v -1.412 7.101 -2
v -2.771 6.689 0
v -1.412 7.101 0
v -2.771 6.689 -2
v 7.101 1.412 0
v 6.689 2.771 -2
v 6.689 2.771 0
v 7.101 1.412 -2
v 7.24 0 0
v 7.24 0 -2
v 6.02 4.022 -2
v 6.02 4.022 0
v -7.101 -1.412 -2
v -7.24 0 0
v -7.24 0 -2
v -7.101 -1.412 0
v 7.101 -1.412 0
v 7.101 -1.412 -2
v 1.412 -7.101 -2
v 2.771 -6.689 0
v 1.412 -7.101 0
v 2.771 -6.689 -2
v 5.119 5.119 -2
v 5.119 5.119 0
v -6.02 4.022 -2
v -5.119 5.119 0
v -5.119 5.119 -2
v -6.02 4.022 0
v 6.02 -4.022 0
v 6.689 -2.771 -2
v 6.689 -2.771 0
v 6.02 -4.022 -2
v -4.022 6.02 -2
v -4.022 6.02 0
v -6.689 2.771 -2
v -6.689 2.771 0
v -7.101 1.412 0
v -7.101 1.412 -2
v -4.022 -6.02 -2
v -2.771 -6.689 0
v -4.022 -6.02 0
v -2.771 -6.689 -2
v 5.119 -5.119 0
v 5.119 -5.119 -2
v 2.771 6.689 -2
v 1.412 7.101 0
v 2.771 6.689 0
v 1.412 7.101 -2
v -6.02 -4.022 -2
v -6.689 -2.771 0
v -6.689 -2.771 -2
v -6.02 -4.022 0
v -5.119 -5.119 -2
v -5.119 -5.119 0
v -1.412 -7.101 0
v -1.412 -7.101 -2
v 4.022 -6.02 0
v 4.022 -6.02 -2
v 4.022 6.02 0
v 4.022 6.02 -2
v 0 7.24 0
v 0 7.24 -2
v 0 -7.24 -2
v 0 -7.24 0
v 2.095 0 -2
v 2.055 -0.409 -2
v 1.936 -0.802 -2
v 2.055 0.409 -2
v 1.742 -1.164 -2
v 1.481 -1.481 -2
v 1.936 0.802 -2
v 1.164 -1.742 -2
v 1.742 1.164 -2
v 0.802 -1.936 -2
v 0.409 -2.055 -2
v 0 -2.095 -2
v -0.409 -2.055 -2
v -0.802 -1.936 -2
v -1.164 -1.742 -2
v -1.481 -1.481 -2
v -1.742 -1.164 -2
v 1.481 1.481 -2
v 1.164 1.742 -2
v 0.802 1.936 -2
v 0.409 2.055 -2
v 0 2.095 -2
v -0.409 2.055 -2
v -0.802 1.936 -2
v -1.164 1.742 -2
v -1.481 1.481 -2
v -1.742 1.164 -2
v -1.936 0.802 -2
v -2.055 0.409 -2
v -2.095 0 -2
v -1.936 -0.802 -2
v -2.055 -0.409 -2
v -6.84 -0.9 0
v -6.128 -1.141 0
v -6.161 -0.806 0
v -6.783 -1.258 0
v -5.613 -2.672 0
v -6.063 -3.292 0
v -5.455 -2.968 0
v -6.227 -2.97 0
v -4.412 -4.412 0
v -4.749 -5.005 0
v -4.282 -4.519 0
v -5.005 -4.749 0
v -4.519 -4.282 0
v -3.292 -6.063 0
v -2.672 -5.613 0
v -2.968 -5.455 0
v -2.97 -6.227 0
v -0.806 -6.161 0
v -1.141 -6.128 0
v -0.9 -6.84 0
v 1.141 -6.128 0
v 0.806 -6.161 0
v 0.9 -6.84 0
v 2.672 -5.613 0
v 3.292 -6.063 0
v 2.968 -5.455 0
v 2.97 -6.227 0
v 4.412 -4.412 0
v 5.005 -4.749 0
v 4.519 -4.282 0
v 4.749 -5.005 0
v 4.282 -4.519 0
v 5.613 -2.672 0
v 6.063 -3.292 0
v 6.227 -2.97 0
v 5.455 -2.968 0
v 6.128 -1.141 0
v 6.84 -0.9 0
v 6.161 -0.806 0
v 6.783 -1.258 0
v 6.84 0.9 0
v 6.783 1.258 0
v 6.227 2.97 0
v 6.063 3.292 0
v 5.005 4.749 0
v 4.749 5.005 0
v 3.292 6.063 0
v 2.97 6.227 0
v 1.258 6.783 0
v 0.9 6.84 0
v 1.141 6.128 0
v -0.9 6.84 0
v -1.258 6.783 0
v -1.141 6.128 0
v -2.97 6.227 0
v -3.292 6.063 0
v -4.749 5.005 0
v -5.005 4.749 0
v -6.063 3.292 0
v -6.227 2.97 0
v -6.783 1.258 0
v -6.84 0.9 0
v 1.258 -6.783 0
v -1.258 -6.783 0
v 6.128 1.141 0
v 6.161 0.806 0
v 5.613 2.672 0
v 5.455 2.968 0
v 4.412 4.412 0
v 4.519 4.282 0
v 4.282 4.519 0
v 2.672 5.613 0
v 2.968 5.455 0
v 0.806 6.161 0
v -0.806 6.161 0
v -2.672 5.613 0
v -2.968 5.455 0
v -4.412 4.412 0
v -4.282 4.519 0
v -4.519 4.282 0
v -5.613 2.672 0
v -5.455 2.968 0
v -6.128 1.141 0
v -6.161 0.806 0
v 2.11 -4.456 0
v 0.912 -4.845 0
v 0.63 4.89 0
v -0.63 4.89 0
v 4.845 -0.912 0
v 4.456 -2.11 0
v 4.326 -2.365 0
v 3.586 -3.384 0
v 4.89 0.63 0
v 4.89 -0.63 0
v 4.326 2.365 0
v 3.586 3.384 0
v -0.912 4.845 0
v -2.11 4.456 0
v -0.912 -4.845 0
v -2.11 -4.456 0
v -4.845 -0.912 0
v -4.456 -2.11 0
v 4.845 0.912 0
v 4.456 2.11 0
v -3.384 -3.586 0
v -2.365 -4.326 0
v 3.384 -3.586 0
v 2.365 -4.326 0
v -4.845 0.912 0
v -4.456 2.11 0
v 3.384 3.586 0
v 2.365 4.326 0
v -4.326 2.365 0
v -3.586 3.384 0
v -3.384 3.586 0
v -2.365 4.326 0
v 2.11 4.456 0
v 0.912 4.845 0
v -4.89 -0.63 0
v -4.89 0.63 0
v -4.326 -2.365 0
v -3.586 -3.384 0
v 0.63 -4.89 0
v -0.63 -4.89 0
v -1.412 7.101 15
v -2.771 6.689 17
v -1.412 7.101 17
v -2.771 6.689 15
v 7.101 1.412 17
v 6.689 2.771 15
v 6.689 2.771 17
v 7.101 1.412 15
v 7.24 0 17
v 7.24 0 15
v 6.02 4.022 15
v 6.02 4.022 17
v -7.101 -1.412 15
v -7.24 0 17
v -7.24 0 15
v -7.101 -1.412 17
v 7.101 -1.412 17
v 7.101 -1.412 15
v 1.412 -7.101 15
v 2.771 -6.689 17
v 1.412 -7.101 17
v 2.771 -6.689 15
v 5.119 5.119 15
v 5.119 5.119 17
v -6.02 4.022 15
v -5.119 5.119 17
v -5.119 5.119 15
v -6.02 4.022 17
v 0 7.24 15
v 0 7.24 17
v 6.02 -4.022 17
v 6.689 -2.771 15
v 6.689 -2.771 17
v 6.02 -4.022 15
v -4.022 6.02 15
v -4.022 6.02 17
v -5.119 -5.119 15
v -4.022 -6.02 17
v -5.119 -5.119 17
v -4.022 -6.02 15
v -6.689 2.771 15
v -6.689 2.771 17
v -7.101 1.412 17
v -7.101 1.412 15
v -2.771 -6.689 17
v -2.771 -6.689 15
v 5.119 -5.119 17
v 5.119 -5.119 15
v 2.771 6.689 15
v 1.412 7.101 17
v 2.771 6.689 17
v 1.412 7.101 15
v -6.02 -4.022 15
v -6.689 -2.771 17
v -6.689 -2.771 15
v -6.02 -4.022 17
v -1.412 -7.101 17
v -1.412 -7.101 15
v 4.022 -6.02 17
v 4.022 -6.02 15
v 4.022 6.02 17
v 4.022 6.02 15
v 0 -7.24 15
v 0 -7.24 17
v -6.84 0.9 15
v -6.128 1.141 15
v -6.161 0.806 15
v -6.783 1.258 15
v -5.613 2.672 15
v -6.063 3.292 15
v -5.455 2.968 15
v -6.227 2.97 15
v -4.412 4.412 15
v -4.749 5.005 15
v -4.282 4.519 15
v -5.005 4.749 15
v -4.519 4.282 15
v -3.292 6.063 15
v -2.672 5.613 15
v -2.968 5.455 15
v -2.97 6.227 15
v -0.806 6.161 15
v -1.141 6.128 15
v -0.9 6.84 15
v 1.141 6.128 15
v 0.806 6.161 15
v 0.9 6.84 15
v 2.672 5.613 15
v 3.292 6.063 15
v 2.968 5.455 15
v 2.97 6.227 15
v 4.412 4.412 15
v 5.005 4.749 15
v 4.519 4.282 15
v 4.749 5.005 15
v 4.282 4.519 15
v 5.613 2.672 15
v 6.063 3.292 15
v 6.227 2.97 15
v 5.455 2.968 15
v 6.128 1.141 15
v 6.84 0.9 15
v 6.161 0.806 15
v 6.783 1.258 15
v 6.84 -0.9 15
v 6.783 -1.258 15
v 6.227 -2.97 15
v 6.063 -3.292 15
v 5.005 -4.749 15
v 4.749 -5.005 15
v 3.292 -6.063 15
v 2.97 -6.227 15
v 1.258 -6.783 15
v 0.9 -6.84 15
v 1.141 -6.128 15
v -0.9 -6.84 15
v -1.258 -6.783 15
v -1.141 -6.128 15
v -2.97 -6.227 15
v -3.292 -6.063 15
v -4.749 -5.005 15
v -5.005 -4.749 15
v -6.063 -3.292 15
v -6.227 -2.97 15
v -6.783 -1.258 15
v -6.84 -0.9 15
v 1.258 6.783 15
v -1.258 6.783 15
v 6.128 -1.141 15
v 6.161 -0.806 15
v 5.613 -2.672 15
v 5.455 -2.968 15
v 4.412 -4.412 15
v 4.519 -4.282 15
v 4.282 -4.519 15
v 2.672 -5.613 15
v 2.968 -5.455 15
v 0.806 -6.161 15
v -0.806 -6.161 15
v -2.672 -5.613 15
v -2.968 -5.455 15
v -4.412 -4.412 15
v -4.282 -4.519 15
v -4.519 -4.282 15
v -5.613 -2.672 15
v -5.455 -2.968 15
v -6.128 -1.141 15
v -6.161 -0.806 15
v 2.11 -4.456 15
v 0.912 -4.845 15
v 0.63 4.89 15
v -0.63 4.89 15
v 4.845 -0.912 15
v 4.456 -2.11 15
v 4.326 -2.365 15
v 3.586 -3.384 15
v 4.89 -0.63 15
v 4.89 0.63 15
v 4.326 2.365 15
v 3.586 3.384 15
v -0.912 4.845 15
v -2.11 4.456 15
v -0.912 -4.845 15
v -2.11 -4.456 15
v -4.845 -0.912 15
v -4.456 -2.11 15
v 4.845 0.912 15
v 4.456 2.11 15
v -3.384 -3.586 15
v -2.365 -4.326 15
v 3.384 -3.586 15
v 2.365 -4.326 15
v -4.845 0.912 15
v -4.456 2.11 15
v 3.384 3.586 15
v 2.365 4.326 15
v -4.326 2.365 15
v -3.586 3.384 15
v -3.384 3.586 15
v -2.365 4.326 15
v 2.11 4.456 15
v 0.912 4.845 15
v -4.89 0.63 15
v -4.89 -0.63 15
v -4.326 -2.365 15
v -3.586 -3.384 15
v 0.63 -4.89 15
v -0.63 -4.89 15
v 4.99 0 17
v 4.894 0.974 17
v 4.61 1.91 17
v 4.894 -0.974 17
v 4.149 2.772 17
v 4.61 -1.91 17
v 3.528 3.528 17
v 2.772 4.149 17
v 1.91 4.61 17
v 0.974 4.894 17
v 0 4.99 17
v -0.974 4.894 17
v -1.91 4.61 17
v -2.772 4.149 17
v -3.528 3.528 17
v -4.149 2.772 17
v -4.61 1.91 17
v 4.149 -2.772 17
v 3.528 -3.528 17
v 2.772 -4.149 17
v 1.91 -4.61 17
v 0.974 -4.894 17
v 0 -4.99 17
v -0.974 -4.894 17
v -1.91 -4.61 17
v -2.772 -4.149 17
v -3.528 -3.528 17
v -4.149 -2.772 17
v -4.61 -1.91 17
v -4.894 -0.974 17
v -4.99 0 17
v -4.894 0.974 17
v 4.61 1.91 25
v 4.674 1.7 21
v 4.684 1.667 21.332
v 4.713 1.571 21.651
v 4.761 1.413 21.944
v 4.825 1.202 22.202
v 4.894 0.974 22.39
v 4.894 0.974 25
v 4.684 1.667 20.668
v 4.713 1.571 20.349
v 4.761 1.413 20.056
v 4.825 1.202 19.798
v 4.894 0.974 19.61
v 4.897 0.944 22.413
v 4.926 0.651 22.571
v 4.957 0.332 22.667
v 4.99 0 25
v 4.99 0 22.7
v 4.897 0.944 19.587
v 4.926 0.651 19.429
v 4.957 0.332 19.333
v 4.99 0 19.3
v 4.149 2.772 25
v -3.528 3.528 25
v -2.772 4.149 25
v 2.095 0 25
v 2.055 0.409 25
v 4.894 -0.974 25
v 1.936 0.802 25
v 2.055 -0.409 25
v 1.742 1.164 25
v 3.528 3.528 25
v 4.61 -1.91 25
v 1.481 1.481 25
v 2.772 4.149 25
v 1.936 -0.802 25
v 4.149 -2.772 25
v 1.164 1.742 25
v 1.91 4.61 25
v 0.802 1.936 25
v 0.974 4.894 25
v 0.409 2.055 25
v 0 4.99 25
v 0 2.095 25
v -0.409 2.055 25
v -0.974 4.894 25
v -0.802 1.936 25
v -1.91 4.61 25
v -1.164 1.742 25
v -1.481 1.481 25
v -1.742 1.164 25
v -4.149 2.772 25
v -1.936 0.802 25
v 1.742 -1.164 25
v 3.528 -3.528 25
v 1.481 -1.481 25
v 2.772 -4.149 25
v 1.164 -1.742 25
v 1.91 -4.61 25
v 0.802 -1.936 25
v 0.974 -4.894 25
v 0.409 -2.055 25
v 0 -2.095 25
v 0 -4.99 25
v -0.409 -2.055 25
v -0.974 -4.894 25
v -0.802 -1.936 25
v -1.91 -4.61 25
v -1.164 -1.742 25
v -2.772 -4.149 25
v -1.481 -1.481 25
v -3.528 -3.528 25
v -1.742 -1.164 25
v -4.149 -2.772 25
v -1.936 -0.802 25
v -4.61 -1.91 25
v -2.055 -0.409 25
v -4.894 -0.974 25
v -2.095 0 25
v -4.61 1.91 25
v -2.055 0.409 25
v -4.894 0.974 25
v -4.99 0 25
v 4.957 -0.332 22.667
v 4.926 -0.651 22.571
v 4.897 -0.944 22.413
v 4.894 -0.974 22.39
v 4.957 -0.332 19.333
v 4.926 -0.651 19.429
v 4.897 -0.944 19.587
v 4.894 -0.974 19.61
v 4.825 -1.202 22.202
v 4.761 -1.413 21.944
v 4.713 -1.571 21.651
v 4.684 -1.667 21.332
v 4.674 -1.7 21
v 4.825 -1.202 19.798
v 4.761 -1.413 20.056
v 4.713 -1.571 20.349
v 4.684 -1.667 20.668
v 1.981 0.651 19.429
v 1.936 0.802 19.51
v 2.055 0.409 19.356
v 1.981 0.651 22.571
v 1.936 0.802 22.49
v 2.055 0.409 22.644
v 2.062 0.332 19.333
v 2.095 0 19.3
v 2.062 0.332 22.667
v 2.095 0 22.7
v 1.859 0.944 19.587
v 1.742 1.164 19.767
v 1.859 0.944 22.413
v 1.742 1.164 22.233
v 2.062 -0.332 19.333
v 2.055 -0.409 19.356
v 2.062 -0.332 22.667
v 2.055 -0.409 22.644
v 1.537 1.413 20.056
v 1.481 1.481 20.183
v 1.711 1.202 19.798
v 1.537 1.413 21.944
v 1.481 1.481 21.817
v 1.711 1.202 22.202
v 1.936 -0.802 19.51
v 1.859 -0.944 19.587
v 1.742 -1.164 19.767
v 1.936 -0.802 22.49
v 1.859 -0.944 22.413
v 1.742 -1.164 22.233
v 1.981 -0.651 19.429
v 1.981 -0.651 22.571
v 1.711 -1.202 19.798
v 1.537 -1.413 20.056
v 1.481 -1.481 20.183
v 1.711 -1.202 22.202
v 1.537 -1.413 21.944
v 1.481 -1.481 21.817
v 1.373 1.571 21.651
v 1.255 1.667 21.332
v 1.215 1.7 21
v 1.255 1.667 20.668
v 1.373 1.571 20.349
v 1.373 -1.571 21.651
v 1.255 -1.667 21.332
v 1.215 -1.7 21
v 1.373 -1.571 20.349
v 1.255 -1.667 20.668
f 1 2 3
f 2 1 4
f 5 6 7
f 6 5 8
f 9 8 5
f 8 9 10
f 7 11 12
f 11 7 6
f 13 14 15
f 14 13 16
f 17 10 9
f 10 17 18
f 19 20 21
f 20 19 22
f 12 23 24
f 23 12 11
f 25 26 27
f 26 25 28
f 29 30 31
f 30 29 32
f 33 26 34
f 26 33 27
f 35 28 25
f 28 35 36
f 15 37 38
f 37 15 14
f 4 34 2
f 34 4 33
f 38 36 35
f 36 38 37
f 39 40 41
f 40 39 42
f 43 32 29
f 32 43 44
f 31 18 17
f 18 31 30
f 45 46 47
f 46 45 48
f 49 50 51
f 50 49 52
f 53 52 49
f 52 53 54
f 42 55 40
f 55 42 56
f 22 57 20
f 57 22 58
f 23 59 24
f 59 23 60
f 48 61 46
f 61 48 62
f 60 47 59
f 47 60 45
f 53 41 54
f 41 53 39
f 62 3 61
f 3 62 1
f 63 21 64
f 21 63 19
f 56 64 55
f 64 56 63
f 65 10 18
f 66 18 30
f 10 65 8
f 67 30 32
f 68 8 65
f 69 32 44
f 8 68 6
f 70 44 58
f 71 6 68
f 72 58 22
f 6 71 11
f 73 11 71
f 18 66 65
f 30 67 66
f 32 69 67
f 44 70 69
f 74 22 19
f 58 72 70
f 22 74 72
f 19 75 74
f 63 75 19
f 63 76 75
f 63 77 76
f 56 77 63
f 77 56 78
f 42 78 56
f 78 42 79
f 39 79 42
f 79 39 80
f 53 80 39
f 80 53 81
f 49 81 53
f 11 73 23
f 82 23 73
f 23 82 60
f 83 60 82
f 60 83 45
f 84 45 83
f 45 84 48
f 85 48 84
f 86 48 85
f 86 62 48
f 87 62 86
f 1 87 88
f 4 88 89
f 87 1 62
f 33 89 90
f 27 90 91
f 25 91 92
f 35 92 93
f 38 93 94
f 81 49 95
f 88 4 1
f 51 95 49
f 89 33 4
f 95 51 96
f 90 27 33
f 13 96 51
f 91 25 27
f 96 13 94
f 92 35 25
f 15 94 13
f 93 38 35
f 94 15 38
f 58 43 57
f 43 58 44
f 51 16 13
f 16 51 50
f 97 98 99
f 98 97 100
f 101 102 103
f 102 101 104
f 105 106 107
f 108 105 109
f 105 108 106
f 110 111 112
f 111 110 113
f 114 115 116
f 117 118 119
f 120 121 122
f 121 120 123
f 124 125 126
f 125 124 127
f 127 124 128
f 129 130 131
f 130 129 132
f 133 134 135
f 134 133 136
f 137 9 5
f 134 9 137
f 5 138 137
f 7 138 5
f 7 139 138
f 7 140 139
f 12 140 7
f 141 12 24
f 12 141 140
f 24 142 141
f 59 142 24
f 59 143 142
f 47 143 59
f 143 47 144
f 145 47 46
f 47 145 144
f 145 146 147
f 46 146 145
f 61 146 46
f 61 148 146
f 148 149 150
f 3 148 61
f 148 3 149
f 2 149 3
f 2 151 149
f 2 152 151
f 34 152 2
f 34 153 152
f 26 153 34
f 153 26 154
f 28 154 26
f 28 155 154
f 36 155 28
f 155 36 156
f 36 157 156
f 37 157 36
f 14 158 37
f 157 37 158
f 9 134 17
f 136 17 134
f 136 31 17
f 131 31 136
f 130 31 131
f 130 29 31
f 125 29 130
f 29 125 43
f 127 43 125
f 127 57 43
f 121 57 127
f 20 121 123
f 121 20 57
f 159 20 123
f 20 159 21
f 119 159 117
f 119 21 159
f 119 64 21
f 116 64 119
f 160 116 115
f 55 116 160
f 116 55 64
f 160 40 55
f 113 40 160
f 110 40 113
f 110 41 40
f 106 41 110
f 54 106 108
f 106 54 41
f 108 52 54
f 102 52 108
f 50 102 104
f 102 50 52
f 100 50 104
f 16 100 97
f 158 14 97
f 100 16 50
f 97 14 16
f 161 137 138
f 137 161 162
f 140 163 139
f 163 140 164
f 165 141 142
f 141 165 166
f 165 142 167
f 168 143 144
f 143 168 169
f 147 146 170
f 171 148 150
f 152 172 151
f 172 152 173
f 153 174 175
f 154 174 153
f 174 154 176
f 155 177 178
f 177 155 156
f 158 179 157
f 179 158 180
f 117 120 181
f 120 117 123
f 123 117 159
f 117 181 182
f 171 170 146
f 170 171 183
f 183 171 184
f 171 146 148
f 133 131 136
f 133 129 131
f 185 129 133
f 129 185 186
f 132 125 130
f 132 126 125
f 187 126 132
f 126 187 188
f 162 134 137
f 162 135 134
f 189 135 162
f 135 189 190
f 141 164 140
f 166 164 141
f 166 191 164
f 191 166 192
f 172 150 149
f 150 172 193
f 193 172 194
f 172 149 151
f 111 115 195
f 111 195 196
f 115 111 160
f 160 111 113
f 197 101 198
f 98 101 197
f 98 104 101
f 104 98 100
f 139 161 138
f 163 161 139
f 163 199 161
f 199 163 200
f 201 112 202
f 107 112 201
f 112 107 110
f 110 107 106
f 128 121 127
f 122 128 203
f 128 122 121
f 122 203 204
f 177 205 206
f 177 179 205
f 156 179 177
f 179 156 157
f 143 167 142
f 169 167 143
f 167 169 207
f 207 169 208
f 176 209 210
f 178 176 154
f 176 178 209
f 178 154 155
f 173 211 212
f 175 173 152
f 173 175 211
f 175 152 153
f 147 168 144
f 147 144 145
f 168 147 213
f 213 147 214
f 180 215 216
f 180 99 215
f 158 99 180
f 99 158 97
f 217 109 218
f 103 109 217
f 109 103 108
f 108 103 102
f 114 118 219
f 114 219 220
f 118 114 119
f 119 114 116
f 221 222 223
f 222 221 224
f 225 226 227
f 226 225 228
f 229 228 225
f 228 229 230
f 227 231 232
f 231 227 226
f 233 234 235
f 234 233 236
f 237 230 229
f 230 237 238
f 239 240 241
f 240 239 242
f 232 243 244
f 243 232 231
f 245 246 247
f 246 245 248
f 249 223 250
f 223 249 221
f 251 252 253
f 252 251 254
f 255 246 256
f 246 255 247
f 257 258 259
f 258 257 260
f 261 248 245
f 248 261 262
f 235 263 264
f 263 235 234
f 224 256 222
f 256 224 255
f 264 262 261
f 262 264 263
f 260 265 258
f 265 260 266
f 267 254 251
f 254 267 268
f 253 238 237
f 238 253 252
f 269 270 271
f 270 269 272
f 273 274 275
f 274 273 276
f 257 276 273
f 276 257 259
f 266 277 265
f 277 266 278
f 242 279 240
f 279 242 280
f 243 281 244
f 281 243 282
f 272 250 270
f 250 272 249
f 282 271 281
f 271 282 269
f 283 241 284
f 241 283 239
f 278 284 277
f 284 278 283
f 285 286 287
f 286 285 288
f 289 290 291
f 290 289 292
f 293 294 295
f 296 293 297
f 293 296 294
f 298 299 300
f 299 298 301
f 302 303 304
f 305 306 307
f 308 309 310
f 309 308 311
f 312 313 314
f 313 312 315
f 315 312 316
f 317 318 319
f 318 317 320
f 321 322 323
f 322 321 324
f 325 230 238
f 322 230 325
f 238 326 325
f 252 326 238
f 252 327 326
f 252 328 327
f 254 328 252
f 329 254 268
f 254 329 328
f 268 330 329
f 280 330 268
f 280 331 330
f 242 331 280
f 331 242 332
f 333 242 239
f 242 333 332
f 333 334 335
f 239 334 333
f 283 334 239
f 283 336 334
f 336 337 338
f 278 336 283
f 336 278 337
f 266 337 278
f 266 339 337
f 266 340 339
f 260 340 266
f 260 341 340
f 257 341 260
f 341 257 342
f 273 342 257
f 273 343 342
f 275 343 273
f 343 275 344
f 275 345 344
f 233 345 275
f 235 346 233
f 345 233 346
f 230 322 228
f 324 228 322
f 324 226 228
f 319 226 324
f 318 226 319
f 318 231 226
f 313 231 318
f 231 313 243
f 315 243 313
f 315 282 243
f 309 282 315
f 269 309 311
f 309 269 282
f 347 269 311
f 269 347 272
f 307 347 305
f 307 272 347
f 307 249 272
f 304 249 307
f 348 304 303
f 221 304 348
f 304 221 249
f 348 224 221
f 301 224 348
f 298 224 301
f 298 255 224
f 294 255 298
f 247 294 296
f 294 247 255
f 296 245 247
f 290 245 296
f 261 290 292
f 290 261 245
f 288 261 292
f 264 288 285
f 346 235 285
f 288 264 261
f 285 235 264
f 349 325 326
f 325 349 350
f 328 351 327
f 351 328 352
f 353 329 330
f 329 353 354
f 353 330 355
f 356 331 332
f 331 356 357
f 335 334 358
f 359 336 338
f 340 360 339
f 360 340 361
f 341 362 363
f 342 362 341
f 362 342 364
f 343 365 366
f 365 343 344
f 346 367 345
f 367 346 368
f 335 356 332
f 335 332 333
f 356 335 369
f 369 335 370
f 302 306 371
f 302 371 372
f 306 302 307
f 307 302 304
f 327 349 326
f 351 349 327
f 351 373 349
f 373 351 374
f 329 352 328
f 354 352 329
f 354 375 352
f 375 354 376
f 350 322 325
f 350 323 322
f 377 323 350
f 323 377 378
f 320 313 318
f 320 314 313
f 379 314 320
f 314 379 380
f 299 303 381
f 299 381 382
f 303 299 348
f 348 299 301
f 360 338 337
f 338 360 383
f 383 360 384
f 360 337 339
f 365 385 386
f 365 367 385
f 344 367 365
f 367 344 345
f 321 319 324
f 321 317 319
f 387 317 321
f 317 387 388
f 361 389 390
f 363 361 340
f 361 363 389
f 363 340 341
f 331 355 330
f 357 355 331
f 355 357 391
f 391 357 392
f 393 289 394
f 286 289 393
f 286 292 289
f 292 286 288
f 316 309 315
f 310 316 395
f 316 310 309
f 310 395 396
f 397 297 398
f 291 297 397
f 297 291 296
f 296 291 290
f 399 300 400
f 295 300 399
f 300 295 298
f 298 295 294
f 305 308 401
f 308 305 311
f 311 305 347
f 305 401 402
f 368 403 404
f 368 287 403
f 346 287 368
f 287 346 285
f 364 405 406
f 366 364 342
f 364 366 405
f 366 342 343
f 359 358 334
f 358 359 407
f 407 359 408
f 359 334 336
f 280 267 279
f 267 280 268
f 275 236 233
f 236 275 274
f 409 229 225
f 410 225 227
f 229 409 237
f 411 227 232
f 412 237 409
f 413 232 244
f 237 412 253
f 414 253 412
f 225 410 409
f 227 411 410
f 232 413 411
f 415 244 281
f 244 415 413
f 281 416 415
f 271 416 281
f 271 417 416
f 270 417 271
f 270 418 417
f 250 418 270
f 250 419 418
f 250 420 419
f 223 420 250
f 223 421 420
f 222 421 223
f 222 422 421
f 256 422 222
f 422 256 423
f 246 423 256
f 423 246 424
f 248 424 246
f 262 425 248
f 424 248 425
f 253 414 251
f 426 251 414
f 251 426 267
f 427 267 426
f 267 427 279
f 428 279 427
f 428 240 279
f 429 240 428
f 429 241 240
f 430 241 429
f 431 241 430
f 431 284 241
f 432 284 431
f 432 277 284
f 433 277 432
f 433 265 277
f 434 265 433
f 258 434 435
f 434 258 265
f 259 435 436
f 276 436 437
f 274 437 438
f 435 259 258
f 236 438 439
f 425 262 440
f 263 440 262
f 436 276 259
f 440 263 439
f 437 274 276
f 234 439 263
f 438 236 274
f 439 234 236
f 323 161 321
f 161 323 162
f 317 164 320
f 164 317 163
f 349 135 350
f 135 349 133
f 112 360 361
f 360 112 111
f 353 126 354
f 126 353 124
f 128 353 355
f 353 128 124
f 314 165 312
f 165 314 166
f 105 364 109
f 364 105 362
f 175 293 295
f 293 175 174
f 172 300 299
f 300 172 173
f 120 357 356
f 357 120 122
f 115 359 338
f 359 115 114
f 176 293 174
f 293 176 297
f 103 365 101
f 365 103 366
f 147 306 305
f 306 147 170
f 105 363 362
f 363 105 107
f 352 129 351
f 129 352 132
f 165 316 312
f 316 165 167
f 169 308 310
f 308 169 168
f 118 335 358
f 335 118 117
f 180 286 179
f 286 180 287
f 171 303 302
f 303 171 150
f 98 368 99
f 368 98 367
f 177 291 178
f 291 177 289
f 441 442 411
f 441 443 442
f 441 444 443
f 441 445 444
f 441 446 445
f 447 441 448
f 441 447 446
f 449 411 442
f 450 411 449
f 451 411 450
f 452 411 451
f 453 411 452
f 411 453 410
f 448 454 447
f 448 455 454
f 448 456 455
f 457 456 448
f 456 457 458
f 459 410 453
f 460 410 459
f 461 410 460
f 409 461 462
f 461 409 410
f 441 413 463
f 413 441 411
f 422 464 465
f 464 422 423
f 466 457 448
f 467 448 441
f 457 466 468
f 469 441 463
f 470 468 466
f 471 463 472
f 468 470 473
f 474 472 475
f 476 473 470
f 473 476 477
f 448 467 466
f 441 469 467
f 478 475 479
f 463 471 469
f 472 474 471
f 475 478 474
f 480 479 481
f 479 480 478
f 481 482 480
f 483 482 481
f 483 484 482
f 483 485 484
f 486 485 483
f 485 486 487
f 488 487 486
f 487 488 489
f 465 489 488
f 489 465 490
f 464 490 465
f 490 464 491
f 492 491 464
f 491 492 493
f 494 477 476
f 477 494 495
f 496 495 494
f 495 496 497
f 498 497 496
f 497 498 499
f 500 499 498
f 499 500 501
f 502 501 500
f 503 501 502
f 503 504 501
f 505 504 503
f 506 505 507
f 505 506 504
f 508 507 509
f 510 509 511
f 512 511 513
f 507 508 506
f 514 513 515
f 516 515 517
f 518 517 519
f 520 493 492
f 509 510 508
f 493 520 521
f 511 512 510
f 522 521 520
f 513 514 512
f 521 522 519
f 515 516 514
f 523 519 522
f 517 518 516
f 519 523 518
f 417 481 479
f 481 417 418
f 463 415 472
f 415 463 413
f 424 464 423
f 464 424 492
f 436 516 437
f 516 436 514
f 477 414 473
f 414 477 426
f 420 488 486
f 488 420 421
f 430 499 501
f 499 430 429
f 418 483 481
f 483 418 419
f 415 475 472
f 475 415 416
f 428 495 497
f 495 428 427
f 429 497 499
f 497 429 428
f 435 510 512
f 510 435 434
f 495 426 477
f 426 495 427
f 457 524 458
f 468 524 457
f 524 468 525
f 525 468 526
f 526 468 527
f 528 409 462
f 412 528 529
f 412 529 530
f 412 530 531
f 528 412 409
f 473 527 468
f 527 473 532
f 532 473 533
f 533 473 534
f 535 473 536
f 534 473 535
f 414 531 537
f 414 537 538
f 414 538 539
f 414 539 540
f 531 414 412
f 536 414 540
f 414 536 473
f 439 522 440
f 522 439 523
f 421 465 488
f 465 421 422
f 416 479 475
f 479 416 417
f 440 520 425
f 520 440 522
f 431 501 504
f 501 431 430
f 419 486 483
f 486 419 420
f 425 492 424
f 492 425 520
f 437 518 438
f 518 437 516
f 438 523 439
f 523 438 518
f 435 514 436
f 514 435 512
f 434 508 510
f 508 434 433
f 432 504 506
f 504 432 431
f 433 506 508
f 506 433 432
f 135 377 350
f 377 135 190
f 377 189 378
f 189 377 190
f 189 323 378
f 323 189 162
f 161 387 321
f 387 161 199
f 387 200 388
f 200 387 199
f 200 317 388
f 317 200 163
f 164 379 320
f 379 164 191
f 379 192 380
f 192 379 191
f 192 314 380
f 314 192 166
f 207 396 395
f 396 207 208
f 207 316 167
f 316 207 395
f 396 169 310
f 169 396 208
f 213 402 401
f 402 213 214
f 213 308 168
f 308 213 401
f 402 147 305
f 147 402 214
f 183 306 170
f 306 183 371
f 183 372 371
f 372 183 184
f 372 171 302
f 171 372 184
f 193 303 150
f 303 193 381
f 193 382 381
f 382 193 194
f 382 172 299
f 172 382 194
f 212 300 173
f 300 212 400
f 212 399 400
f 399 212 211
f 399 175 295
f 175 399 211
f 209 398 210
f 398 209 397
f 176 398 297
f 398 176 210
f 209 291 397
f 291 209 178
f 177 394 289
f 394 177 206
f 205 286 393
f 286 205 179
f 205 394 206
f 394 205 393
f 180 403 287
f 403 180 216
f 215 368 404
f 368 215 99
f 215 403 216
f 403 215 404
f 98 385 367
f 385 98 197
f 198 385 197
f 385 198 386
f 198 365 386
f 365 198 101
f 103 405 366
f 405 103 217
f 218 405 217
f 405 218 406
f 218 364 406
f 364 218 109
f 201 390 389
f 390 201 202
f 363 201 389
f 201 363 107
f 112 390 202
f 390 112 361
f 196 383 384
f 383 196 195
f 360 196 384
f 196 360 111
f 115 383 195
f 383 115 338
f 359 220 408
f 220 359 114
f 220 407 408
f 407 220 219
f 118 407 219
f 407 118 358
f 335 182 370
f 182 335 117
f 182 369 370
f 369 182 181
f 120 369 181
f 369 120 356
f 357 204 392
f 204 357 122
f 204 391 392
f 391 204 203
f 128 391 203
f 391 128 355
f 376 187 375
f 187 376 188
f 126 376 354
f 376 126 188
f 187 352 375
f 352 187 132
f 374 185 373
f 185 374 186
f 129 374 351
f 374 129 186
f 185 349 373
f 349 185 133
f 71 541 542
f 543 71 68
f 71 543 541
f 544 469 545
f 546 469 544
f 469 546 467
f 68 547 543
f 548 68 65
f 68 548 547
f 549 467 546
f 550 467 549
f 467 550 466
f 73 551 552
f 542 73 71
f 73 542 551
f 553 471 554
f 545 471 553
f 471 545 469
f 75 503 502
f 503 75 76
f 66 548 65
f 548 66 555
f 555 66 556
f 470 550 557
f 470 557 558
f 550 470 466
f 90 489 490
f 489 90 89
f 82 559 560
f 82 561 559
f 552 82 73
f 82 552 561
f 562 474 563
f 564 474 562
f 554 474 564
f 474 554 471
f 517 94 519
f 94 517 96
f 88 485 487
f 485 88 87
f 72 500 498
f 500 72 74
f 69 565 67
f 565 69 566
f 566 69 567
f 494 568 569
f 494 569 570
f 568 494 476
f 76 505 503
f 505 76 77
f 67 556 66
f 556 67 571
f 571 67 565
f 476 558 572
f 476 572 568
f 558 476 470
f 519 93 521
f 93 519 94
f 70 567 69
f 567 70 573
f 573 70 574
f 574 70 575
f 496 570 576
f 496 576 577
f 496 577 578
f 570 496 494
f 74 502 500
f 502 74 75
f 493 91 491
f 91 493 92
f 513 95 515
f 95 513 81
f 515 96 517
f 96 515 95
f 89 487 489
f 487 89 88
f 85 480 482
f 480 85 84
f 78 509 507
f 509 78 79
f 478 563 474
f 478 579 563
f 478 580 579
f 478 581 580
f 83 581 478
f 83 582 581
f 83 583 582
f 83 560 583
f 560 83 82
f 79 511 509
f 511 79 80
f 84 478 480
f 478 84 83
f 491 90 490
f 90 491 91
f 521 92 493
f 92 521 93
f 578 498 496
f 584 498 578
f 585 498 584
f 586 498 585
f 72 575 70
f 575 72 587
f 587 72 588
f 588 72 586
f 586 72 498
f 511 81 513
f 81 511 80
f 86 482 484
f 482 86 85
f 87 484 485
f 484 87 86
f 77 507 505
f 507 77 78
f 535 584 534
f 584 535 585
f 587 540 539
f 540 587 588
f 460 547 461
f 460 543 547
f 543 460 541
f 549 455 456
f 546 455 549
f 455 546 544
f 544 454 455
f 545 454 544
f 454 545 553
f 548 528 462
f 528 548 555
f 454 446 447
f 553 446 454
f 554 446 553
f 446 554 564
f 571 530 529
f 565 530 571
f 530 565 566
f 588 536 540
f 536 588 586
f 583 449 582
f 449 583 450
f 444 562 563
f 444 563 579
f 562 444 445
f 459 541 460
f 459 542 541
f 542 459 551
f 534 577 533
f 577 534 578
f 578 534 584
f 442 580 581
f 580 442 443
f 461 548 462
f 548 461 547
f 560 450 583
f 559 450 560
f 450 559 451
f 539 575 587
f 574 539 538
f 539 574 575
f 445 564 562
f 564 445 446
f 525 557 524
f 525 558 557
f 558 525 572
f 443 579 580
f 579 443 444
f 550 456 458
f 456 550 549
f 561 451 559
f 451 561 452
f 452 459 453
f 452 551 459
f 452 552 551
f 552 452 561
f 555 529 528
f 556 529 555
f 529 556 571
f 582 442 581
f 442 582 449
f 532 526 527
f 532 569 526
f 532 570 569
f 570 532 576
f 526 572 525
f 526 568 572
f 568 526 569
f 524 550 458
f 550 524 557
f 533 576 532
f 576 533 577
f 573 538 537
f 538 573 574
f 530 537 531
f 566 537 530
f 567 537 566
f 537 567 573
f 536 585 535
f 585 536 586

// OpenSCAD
$fn = 32;

// ----------------------------------------------------------------------
// Timing pulley: GT2 20T, pitch 2 mm, 14.48 mm x 27 mm
// ----------------------------------------------------------------------

// --- parameters (mm) ---
pitch_mm = 2;             // belt pitch
tooth_count = 20;         // number of grooves
width = 15;               // belt width between the flanges
tip_d = 12.48;            // tip circle diameter
root_d = 10.98;           // groove bottom diameter
groove_h = 0.75;          // groove depth
tooth_w = 1.5;            // groove width at the tip circle
side_d = 14.48;           // flange diameter
side_t = 2;               // flange thickness
spigot_d = 9.38;          // flange spigot, sunk into the rim
spigot_h = 1.2;           // spigot depth into the rim
hub_bore = 4.19;          // shaft bore
hub_d = 9.98;             // hub diameter
hub_h = 8;                // hub above the flange
bottom_z = -2;            // lowest point of the pulley
top_z = 25;               // highest point of the pulley
set_d = 3.4;              // set screw tap hole

module rim() {
  cylinder(h = width, d = tip_d);
}

module groove_cutter() {
  /* belt tooth groove: deeper than wide, cut through the belt width */
  translate([root_d / 2, 0, 0])
    linear_extrude(height = width)
      polygon(points = [[-0.6, -tooth_w * 0.42], [groove_h + 0.6, -tooth_w * 0.6],
                        [groove_h + 0.6, tooth_w * 0.6], [-0.6, tooth_w * 0.42]]);
}

module flanges() {
  translate([0, 0, -side_t]) cylinder(h = side_t, d = side_d);
  translate([0, 0, width]) cylinder(h = side_t, d = side_d);
  translate([0, 0, -spigot_h]) cylinder(h = spigot_h + 0.6, d = spigot_d);
  translate([0, 0, width - 0.6]) cylinder(h = spigot_h + 0.6, d = spigot_d);
}

module hub() {
  translate([0, 0, bottom_z]) cylinder(h = top_z - bottom_z, d = hub_d);
}

difference() {
  union() {
    rim();
    hub();
    flanges();
  }
  for (i = [0 : tooth_count - 1]) rotate([0, 0, i * 360 / tooth_count]) groove_cutter();
  translate([0, 0, bottom_z - 1]) cylinder(h = top_z - bottom_z + 2, d = hub_bore);
  translate([-1, 0, top_z - hub_h * 0.5]) rotate([0, 90, 0]) cylinder(h = hub_d / 2 + 3, d = set_d);
}
